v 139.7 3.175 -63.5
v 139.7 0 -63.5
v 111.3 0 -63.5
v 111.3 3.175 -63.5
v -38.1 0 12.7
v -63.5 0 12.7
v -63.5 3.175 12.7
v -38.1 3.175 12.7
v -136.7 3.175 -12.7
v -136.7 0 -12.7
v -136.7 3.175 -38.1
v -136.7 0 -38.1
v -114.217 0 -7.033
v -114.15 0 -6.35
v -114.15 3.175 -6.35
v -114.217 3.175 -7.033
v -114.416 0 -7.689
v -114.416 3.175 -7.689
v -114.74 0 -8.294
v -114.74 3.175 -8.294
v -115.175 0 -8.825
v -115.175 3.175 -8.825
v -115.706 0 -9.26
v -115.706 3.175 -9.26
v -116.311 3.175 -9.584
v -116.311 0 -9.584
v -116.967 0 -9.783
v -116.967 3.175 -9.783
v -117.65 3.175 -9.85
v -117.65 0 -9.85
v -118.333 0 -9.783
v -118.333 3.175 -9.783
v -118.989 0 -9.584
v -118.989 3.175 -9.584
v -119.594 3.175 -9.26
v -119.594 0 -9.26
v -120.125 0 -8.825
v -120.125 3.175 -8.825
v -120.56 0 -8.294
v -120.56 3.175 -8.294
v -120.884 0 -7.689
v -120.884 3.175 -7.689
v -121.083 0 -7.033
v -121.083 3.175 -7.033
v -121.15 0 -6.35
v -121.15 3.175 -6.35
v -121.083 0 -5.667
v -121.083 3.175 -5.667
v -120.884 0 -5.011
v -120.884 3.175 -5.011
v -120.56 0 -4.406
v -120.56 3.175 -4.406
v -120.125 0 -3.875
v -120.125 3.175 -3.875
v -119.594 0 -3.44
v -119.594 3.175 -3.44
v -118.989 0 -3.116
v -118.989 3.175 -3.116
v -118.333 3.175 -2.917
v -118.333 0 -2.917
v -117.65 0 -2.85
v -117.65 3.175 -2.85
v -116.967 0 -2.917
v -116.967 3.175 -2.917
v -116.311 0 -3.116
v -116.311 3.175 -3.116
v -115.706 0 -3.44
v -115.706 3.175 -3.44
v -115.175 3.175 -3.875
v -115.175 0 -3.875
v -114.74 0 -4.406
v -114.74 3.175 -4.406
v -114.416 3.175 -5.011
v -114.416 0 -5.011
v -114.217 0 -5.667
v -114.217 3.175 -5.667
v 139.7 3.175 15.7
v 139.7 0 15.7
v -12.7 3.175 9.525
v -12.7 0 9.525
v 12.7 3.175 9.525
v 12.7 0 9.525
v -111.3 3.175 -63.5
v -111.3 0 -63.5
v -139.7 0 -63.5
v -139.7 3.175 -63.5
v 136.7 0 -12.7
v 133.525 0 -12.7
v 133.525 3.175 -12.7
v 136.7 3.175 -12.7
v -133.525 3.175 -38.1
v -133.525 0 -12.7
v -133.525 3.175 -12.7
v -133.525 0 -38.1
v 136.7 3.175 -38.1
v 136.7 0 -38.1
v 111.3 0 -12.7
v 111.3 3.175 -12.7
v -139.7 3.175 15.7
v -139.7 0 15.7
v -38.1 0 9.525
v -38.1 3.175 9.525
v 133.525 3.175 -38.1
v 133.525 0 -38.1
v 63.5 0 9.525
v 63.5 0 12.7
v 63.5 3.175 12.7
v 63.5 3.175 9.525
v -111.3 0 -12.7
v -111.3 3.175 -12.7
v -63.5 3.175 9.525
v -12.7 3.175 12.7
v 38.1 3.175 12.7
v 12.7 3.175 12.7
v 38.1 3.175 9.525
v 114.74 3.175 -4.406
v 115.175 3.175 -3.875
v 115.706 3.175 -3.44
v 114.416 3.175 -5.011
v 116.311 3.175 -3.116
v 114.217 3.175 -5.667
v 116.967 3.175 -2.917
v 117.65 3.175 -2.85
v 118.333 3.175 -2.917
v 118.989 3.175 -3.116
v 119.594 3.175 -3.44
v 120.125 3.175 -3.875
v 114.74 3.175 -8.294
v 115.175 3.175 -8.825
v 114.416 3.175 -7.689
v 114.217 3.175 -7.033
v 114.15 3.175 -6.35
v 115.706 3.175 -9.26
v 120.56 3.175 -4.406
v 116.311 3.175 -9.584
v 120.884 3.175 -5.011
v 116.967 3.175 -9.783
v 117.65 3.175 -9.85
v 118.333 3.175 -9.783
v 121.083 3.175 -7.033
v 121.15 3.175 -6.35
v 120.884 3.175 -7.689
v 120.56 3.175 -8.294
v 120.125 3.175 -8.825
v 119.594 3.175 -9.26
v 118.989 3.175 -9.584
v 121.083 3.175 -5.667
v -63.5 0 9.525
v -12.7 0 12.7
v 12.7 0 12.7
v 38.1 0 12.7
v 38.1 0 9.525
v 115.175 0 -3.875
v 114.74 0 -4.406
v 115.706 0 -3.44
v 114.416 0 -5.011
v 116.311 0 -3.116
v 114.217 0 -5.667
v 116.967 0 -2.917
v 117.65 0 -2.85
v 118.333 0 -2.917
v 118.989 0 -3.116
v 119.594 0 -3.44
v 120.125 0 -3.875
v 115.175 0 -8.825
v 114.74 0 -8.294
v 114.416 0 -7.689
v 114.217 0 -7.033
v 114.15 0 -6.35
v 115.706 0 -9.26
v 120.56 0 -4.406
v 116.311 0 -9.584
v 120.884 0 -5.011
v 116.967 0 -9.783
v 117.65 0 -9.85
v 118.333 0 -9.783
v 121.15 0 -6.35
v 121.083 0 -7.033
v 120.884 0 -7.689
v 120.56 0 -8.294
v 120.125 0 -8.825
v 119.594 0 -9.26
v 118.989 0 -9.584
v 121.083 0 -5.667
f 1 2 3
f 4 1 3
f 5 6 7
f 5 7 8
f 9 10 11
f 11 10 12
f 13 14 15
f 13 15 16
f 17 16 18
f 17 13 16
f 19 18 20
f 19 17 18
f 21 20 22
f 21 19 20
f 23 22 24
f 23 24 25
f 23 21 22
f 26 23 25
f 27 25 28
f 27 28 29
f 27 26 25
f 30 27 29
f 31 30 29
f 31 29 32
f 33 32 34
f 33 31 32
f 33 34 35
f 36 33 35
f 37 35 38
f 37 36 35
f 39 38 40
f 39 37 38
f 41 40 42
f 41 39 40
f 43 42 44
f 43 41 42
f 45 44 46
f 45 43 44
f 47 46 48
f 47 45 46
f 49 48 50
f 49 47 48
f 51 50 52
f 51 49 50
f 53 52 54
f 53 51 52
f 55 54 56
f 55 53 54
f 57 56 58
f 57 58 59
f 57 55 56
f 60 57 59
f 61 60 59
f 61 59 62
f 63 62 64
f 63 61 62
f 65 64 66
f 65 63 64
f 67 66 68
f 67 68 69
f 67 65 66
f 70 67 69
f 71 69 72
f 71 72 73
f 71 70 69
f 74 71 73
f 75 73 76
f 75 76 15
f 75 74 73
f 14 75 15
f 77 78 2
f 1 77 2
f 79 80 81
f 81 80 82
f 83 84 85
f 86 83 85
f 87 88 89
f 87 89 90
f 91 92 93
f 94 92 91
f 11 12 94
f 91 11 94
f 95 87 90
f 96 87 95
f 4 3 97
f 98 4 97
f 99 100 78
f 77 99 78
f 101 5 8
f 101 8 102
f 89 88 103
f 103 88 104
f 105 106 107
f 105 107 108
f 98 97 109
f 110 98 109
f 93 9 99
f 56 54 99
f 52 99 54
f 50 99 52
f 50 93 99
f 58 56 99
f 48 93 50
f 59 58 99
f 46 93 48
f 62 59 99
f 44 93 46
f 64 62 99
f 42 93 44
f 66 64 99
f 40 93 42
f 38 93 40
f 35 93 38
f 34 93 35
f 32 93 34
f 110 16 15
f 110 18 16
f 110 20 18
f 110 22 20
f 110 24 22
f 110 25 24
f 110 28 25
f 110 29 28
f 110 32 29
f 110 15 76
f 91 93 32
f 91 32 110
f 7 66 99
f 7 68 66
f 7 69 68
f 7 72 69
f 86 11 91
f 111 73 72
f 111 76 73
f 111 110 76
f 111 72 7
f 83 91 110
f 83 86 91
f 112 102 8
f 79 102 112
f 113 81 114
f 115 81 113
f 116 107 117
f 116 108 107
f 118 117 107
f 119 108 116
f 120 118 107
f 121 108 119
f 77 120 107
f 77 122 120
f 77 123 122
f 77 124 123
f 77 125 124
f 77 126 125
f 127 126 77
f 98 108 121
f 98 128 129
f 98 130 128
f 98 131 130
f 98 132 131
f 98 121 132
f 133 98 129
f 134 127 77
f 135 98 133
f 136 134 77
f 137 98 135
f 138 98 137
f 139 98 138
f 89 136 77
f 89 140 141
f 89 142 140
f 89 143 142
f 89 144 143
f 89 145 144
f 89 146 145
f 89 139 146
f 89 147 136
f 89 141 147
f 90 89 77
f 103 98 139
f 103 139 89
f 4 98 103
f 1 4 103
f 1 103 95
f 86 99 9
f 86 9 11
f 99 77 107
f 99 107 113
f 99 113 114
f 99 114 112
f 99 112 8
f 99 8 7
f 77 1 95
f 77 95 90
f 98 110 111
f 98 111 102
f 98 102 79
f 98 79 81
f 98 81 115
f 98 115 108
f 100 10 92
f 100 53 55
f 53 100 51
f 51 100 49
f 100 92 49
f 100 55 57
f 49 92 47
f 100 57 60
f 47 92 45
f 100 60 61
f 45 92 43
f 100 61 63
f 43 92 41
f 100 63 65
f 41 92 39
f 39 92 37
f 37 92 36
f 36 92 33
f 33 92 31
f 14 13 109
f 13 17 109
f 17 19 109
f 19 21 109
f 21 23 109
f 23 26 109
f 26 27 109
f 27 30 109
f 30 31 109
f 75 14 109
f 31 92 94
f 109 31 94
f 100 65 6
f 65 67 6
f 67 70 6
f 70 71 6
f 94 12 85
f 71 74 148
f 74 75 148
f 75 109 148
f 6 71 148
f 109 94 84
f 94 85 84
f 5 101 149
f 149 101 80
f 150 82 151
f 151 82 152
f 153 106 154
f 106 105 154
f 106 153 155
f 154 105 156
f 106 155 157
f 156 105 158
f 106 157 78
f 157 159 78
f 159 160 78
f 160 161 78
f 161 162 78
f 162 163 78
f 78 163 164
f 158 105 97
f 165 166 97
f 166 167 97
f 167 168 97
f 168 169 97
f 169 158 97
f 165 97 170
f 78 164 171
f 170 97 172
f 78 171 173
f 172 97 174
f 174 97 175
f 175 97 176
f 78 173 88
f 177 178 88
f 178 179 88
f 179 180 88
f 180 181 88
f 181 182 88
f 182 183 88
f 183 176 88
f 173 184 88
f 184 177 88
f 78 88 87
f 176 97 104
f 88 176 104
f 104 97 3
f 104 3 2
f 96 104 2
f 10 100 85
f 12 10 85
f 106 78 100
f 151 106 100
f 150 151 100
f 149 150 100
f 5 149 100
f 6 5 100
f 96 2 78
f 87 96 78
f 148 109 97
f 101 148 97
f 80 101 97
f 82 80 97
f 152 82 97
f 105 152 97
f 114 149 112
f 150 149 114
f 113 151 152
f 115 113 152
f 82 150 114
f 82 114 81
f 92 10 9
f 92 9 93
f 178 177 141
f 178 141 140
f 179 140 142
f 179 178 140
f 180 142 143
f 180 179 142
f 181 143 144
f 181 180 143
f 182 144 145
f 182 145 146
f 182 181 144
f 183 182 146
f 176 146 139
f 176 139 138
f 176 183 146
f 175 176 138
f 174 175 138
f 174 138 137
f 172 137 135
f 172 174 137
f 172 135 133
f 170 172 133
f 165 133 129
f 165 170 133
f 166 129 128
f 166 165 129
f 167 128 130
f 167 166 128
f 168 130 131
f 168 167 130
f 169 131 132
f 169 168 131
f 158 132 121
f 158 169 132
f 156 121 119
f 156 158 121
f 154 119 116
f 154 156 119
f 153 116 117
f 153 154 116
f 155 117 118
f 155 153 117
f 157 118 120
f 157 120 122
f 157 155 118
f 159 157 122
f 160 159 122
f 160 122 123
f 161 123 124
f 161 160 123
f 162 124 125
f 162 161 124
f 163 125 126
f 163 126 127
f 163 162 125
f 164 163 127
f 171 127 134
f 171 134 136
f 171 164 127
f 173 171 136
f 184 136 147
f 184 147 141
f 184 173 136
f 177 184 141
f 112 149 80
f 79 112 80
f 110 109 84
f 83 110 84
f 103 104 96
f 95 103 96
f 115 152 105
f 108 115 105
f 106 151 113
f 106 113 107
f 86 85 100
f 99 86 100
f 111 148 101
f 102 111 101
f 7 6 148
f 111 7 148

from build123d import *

# Parameters (mm, degrees)
SKETCH1_W           = 3.175
SKETCH1_H           = 25.4
SKETCH1_W_2         = 25.4
SKETCH1_H_2         = 3.175
SKETCH1_R           = 3.5
BOSS_EXTRUDE1_DEPTH = 3.175


with BuildPart() as part:
    # Sketch1 → Boss-Extrude1 (new body)
    with BuildSketch(Plane(origin=(0, 0, 0), x_dir=(1, 0, 0), z_dir=(0, 1, 0))):
        Polygon((-111.3, 63.5), (-139.7, 63.5), (-139.7, -15.7), (139.7, -15.7), (139.7, 63.5), (111.3, 63.5), (111.3, 12.7), (-111.3, 12.7), align=None)
        with Locations((135.1125, 25.4)):
            Rectangle(SKETCH1_W, SKETCH1_H, mode=Mode.SUBTRACT)
        with Locations((50.8, -11.1125)):
            Rectangle(SKETCH1_W_2, SKETCH1_H_2, mode=Mode.SUBTRACT)
        with Locations((0, -11.1125)):
            Rectangle(SKETCH1_W_2, SKETCH1_H_2, mode=Mode.SUBTRACT)
        with Locations((-50.8, -11.1125)):
            Rectangle(SKETCH1_W_2, SKETCH1_H_2, mode=Mode.SUBTRACT)
        with Locations((-135.1125, 25.4)):
            Rectangle(SKETCH1_W, SKETCH1_H, mode=Mode.SUBTRACT)
        with Locations((-117.65, 6.35)):
            Circle(SKETCH1_R, mode=Mode.SUBTRACT)
        with Locations((117.65, 6.35)):
            Circle(SKETCH1_R, mode=Mode.SUBTRACT)
    extrude(amount=BOSS_EXTRUDE1_DEPTH)


solid = part.part
